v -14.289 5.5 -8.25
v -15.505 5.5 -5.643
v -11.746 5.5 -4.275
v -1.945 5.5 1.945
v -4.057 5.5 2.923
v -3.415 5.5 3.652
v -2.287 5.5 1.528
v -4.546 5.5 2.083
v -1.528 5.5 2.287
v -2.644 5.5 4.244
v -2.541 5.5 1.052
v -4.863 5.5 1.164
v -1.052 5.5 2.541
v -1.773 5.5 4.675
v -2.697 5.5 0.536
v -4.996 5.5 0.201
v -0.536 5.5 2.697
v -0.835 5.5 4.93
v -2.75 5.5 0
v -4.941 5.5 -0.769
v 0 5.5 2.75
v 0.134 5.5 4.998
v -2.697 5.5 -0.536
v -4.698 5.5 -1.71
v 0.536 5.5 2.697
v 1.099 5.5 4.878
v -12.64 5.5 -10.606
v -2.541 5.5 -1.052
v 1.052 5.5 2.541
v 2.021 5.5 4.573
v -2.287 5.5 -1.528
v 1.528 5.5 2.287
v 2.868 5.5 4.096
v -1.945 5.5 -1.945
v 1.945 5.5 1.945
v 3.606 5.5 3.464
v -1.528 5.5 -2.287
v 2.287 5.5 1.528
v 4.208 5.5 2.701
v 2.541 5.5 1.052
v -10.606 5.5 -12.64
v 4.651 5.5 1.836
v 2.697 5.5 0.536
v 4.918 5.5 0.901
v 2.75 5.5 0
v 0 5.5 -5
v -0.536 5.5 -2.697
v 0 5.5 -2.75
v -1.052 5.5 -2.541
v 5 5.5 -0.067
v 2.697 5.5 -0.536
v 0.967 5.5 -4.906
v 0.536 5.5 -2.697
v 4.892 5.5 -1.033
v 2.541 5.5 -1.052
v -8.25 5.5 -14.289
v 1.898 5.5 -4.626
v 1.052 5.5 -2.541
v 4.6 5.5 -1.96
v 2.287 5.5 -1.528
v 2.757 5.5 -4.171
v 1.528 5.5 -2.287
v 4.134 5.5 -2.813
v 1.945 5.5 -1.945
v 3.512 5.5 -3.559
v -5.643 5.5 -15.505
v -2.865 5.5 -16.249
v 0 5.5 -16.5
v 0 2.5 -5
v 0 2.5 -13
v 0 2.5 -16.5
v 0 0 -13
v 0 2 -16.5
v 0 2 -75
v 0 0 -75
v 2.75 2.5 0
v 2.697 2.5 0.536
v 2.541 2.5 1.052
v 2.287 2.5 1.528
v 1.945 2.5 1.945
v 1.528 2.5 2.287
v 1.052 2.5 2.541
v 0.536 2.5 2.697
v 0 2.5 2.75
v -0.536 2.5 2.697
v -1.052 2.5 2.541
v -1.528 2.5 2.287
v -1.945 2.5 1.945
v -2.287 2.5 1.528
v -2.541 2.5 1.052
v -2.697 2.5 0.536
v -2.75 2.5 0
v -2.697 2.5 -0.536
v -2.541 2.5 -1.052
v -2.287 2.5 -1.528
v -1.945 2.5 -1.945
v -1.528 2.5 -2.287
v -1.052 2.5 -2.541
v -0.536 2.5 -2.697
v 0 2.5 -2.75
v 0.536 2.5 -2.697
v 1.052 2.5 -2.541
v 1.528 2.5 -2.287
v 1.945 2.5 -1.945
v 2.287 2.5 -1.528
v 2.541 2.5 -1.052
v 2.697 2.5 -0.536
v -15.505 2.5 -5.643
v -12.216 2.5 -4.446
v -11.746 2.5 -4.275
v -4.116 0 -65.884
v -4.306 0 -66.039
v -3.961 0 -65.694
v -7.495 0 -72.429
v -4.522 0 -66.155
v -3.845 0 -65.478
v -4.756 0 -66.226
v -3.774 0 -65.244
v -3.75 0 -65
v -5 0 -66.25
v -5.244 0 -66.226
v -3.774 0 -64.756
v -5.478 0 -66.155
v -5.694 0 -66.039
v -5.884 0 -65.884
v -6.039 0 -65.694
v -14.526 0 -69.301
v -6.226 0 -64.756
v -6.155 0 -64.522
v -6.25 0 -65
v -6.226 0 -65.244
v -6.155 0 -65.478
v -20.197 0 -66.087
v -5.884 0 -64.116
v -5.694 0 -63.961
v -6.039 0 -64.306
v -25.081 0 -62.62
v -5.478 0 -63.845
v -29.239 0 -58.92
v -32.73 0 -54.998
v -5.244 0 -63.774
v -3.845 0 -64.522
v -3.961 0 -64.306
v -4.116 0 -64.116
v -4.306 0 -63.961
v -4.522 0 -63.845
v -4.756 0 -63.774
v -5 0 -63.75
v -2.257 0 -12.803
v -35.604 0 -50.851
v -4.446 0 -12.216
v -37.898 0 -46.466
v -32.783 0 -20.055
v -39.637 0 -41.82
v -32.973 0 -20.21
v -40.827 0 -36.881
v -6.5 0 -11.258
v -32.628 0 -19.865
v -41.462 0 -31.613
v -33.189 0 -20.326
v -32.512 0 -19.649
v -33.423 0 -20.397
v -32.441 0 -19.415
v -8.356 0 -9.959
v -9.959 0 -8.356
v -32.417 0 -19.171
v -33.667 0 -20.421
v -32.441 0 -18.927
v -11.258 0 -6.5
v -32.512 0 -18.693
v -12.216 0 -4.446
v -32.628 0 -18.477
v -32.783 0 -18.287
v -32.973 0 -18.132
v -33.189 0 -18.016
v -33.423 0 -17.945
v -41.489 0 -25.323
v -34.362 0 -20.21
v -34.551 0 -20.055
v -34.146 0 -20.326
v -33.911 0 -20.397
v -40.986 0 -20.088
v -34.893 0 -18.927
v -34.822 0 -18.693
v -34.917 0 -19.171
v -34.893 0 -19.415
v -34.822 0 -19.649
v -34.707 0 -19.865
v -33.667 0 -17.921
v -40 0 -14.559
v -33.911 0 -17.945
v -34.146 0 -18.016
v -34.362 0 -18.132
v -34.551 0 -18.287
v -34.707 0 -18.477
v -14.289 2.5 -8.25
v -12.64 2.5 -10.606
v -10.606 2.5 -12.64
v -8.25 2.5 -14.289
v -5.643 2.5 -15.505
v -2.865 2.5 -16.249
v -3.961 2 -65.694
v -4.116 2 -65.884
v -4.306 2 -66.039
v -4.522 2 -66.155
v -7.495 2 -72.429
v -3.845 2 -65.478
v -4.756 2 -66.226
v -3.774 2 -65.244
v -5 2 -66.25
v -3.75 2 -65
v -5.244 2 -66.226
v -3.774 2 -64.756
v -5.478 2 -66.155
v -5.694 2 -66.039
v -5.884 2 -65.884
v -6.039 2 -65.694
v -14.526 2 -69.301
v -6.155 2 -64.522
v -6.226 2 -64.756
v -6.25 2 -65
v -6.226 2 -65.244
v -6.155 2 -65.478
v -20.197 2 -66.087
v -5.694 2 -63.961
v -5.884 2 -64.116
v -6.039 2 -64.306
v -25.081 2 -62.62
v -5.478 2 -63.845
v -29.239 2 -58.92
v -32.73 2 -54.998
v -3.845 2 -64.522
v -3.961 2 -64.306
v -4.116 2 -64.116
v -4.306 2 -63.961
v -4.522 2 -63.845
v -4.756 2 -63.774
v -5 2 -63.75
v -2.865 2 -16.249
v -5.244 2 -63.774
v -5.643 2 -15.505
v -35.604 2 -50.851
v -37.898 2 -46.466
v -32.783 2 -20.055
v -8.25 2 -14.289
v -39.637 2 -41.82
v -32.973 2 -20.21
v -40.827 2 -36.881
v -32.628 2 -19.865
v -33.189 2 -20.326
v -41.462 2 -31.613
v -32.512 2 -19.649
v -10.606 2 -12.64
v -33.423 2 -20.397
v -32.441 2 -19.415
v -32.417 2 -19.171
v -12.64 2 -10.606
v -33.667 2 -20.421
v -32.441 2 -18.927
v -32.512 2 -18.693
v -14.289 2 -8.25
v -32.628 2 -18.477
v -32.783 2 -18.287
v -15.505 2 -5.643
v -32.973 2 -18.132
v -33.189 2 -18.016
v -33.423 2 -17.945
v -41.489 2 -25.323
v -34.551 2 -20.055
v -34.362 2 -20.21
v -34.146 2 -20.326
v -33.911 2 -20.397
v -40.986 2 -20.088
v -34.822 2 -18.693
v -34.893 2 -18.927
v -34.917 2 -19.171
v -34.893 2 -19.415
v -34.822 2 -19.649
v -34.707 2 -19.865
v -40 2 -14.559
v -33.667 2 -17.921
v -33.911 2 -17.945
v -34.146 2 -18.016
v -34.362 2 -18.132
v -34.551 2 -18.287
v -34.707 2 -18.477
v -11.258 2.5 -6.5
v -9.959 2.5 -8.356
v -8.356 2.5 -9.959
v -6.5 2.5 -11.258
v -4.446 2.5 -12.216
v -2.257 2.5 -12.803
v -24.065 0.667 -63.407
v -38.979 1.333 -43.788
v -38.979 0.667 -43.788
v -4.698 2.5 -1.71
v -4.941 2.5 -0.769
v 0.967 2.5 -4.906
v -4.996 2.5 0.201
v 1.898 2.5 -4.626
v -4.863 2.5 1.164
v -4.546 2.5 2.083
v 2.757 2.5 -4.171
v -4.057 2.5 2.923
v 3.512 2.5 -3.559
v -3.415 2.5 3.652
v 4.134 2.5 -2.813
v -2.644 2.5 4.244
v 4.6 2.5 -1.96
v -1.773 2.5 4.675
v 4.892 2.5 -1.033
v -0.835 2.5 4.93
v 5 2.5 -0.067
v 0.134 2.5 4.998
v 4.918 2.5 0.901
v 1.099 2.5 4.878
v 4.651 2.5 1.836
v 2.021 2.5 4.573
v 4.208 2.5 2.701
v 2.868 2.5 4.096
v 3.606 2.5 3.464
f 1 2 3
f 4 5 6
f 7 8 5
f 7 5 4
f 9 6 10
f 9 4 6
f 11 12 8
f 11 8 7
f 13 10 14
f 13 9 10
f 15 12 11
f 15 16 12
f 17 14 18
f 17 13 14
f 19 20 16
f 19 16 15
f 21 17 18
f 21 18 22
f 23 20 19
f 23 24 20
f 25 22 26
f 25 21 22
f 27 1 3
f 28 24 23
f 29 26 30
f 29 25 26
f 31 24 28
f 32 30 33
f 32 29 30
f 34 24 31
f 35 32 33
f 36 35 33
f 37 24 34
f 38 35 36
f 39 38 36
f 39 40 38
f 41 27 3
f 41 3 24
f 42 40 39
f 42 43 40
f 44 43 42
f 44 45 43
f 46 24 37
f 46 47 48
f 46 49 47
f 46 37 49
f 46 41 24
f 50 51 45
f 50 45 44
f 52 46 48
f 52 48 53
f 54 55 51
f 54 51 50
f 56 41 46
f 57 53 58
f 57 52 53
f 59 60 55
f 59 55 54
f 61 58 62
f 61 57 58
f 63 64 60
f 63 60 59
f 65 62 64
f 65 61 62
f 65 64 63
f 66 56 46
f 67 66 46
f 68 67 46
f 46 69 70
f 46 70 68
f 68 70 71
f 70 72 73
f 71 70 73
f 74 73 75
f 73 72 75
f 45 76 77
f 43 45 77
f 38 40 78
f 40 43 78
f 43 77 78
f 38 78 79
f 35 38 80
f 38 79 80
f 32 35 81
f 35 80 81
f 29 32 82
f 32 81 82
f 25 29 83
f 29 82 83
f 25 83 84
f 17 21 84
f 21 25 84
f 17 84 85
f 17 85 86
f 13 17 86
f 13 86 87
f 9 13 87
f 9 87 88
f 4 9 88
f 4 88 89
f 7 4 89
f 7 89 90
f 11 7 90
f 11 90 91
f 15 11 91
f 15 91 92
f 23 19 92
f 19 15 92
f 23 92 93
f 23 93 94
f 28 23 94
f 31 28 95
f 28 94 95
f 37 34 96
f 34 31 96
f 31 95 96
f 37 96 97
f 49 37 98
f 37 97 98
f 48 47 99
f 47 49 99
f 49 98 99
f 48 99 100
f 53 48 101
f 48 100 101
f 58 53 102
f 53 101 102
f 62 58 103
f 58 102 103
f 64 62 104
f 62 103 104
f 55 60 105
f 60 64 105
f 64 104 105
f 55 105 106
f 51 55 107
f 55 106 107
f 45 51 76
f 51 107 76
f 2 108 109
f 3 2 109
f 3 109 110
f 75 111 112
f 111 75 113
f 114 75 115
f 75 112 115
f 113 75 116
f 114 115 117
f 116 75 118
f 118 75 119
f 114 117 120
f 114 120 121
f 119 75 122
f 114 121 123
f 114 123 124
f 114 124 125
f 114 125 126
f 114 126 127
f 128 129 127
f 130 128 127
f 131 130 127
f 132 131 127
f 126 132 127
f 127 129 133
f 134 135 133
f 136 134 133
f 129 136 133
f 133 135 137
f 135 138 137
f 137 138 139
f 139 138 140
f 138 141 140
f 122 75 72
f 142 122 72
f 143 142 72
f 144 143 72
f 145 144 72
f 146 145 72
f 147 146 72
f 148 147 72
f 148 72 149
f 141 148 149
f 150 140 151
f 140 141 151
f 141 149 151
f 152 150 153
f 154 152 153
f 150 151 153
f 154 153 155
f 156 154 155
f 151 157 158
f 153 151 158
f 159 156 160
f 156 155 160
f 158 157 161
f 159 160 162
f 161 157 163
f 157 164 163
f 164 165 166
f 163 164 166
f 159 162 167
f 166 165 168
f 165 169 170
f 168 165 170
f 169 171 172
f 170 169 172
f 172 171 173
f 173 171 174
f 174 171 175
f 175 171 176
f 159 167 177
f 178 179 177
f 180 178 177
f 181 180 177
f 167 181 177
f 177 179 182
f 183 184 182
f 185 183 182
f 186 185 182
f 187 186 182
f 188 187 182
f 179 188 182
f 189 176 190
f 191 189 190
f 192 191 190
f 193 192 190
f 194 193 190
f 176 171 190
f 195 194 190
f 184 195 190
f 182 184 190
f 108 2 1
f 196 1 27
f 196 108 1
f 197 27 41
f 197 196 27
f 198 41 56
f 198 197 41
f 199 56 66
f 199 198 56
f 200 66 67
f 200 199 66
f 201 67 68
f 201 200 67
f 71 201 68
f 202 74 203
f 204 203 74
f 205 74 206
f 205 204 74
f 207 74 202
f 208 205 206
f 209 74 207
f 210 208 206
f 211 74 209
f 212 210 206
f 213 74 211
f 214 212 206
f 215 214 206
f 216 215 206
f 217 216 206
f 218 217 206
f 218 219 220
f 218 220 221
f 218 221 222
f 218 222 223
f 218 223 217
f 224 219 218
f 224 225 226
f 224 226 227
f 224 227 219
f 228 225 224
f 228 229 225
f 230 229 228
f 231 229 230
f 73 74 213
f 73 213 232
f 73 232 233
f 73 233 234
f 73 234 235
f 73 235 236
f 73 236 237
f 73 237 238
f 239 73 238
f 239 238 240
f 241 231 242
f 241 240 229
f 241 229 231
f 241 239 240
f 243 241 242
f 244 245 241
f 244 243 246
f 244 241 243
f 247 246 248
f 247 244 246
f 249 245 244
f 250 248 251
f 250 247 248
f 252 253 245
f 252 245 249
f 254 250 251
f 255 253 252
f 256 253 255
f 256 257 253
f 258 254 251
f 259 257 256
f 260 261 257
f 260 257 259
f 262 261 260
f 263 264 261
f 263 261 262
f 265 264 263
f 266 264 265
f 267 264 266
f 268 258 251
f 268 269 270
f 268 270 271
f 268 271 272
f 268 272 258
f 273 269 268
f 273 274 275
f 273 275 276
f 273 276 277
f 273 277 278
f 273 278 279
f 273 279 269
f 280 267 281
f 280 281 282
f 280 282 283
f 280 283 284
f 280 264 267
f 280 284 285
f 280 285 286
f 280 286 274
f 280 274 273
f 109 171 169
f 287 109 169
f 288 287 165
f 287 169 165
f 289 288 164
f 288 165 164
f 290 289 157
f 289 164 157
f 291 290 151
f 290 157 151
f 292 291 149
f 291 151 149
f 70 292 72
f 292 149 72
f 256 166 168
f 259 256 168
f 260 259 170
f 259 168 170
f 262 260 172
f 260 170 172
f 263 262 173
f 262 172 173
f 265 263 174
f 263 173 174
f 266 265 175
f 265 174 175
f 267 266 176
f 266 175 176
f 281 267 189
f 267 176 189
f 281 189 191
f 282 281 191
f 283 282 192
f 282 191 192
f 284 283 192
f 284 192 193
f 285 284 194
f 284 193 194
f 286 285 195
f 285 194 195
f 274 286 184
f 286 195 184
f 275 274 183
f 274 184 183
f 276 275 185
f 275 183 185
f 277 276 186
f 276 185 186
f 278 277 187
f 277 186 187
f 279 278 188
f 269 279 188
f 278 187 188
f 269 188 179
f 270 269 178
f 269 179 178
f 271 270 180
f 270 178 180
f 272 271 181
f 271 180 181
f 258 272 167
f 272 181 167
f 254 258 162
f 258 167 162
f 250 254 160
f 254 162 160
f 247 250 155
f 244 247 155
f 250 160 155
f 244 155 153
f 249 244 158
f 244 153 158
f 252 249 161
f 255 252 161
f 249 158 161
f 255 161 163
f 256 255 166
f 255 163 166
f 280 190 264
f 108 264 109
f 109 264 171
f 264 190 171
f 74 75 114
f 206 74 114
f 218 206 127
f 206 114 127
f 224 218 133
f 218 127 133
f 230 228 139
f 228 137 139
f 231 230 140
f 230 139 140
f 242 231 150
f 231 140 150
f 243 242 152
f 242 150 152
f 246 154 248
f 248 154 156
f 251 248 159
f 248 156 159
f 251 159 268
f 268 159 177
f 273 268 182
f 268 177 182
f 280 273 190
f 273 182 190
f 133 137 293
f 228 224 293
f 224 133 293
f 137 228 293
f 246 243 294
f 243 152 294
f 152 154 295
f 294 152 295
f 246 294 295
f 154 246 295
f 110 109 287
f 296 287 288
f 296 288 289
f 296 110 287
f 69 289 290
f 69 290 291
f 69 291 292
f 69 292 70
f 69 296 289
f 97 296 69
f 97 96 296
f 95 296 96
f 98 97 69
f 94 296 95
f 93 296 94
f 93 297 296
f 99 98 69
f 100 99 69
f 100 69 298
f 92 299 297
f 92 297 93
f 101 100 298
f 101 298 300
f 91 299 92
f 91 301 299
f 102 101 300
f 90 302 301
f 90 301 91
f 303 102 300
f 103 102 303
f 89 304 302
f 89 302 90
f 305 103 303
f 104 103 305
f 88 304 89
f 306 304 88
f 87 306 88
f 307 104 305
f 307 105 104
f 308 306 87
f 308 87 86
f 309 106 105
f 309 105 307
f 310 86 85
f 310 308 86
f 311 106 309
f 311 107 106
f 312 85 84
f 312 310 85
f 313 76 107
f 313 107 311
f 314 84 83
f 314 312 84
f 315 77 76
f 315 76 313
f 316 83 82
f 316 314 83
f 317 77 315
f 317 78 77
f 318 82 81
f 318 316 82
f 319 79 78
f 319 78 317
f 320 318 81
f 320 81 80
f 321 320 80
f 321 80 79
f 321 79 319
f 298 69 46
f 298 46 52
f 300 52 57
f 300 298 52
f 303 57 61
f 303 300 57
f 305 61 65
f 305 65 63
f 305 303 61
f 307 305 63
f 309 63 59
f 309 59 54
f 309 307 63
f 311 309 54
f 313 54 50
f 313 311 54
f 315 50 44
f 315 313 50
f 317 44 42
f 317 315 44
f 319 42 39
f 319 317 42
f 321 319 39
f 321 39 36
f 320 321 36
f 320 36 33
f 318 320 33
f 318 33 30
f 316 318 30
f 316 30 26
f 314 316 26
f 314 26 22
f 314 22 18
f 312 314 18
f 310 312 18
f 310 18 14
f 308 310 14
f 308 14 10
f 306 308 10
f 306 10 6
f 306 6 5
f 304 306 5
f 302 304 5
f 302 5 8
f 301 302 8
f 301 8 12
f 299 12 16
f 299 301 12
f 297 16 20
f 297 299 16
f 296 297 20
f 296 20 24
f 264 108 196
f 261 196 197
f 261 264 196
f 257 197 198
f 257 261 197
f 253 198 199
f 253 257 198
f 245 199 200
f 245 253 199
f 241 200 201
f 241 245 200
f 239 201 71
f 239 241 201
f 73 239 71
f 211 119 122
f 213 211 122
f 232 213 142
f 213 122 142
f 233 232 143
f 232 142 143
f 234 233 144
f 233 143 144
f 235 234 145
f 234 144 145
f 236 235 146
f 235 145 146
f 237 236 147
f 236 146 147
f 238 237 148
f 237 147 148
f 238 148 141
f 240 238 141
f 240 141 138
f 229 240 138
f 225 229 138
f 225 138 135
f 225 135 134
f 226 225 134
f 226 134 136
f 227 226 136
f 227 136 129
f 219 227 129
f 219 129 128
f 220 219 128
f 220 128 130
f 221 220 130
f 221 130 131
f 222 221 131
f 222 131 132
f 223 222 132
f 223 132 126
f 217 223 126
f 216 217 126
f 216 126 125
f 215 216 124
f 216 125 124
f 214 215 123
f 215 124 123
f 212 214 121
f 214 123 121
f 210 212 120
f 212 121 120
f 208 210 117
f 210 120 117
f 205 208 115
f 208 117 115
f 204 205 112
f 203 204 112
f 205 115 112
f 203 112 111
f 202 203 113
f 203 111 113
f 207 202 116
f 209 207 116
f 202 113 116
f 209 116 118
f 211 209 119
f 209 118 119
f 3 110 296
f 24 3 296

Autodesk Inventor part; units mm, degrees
ref_plane "YZ Plane" through (0, 0, 0) normal (1, 0, 0) x (0, 1, 0)
ref_plane "XZ Plane" through (0, 0, 0) normal (0, 1, 0) x (-1, 0, 0)
ref_plane "XY Plane" through (0, 0, 0) normal (0, 0, 1) x (1, 0, 0)
sketch "Sketch1" plane through (0, 0, 0) normal (0, 1, 0) x (-1, 0, 0)
  circle A0 centre (0, 0) radius 12.5
  line L0 (11.7462, -4.2753) -> (40, -14.5588)
  line L1 (0, 0) -> (41.7481, 0) construction
  line L2 (0, 0) -> (11.7462, -4.2753) construction
  line L3 (0, 0) -> (0, -75)
  line L4 (0, -75) -> (27.0598, -66.8927) construction
  line L5 (27.0598, -66.8927) -> (47.507, -49.1207) construction
  line L6 (47.507, -49.1207) -> (40, -14.5588) construction
  spline S0 degree 3 poles (0, -75) (27.0598, -66.8927) (47.507, -49.1207) (40, -14.5588) knots 1 1 1 1 2 2 2 2
  point P0 (0, -12.5)
  dimension "d0" = 25
  dimension "d1" = 40
  dimension "d3" = 20
  dimension "d4" = 75
extrude "Extrusion1" add sketch "Sketch1" along normal blind 2
sketch "Sketch2" plane through (0, 0, 0) normal (0, -1, 0) x (1, 0, 0)
  circle A0 centre (0, 0) radius 2.5
  dimension "d7" = 5
extrude "Extrusion2" add sketch "Sketch2" along normal blind 4
sketch "Sketch3" plane through (0, 0, 0) normal (0, -1, 0) x (1, 0, 0)
  arc A0 (11.7462, -4.2753) -> (0, -12.5) centre (0, 0) ccw projected
  arc A1 (0, -12.5) -> (-11.7462, -4.2753) centre (0, 0) ccw projected
extrude "Extrusion3" cut sketch "Sketch3" against normal mid plane 10
sketch "Sketch4" plane through (0, 2, 0) normal (0, 1, 0) x (1, 0, 0)
  circle A0 centre (0, 0) radius 16.5
  arc A1 (0, 12.5) -> (-11.7462, 4.2753) centre (0, 0) ccw projected
  circle A2 centre (0, 0) radius 4.8598
  line L0 (-40, 14.5588) -> (-11.7462, 4.2753) projected
  line L1 (0, 12.5) -> (0, 75) projected
  point P0 (0, 16.5)
  point P1 (-15.5049, 5.6433)
  dimension "d12" = 4
  dimension "d13" = 9.7195
extrude "Extrusion4" add sketch "Sketch4" along normal blind 0.5 contours L1 A1 L0 A0 picked at (-4.9207, 14.2357)
sketch "Sketch5" plane through (0, 2.5, 0) normal (0, 1, 0) x (1, 0, 0)
  circle A0 centre (0, 0) radius 5
  arc A1 (0, 12.5) -> (-11.7462, 4.2753) centre (0, 0) ccw projected
  line L0 (0, 5) -> (0, 12.5)
  line L1 (-11.7462, 4.2753) -> (-4.6985, 1.7101)
  line L2 (-15.5049, 5.6433) -> (-11.7462, 4.2753) projected
  line L3 (0, 12.5) -> (0, 16.5) projected
  arc A2 (0, 16.5) -> (-15.5049, 5.6433) centre (0, 0) ccw projected
  circle A3 centre (0, 0) radius 2.75
  dimension "d16" = 10
  dimension "d17" = 5.5
extrude "Extrusion5" add sketch "Sketch5" along normal blind 3
sketch "Sketch6" plane through (0, 0, 0) normal (0, -1, 0) x (1, 0, 0)
  arc A0 (-11.7462, -4.2753) -> (0, -12.5) centre (0, 0) ccw projected
  line L0 (0, -12.5) -> (0, -75) projected
  line L1 (-40, -14.5588) -> (-11.7462, -4.2753) projected
  circle A1 centre (0, 0) radius 2.75 projected
  circle A2 centre (0, 0) radius 13
  point P0 (-12.216, -4.4463)
  point P1 (0, -13)
  dimension "d20" = 0.5
extrude "Extrusion6" cut sketch "Sketch6" against normal up to surface (2.5 mm away) contours A0 L0 A2 L1 picked at (-1.0483, -12.7046)
sketch "Sketch7" plane through (0, 0, 0) normal (0, -1, 0) x (1, 0, 0)
  circle A0 centre (-5, -65) radius 1.25
  circle A1 centre (-33.6672, -19.171) radius 1.25
  line L0 (-40, -14.5588) -> (-12.216, -4.4463) projected
  point P0 (0, 0)
  dimension "d23" = 6.5
  dimension "d24" = 19.171
  dimension "d25" = 2.5
  dimension "d26" = 65
  dimension "d27" = 5
extrude "Extrusion7" cut sketch "Sketch7" against normal up to surface (2 mm away)
equation "\"d28\" = d25"
properties part number "clamshell half-2" material "ABS Plastic"
